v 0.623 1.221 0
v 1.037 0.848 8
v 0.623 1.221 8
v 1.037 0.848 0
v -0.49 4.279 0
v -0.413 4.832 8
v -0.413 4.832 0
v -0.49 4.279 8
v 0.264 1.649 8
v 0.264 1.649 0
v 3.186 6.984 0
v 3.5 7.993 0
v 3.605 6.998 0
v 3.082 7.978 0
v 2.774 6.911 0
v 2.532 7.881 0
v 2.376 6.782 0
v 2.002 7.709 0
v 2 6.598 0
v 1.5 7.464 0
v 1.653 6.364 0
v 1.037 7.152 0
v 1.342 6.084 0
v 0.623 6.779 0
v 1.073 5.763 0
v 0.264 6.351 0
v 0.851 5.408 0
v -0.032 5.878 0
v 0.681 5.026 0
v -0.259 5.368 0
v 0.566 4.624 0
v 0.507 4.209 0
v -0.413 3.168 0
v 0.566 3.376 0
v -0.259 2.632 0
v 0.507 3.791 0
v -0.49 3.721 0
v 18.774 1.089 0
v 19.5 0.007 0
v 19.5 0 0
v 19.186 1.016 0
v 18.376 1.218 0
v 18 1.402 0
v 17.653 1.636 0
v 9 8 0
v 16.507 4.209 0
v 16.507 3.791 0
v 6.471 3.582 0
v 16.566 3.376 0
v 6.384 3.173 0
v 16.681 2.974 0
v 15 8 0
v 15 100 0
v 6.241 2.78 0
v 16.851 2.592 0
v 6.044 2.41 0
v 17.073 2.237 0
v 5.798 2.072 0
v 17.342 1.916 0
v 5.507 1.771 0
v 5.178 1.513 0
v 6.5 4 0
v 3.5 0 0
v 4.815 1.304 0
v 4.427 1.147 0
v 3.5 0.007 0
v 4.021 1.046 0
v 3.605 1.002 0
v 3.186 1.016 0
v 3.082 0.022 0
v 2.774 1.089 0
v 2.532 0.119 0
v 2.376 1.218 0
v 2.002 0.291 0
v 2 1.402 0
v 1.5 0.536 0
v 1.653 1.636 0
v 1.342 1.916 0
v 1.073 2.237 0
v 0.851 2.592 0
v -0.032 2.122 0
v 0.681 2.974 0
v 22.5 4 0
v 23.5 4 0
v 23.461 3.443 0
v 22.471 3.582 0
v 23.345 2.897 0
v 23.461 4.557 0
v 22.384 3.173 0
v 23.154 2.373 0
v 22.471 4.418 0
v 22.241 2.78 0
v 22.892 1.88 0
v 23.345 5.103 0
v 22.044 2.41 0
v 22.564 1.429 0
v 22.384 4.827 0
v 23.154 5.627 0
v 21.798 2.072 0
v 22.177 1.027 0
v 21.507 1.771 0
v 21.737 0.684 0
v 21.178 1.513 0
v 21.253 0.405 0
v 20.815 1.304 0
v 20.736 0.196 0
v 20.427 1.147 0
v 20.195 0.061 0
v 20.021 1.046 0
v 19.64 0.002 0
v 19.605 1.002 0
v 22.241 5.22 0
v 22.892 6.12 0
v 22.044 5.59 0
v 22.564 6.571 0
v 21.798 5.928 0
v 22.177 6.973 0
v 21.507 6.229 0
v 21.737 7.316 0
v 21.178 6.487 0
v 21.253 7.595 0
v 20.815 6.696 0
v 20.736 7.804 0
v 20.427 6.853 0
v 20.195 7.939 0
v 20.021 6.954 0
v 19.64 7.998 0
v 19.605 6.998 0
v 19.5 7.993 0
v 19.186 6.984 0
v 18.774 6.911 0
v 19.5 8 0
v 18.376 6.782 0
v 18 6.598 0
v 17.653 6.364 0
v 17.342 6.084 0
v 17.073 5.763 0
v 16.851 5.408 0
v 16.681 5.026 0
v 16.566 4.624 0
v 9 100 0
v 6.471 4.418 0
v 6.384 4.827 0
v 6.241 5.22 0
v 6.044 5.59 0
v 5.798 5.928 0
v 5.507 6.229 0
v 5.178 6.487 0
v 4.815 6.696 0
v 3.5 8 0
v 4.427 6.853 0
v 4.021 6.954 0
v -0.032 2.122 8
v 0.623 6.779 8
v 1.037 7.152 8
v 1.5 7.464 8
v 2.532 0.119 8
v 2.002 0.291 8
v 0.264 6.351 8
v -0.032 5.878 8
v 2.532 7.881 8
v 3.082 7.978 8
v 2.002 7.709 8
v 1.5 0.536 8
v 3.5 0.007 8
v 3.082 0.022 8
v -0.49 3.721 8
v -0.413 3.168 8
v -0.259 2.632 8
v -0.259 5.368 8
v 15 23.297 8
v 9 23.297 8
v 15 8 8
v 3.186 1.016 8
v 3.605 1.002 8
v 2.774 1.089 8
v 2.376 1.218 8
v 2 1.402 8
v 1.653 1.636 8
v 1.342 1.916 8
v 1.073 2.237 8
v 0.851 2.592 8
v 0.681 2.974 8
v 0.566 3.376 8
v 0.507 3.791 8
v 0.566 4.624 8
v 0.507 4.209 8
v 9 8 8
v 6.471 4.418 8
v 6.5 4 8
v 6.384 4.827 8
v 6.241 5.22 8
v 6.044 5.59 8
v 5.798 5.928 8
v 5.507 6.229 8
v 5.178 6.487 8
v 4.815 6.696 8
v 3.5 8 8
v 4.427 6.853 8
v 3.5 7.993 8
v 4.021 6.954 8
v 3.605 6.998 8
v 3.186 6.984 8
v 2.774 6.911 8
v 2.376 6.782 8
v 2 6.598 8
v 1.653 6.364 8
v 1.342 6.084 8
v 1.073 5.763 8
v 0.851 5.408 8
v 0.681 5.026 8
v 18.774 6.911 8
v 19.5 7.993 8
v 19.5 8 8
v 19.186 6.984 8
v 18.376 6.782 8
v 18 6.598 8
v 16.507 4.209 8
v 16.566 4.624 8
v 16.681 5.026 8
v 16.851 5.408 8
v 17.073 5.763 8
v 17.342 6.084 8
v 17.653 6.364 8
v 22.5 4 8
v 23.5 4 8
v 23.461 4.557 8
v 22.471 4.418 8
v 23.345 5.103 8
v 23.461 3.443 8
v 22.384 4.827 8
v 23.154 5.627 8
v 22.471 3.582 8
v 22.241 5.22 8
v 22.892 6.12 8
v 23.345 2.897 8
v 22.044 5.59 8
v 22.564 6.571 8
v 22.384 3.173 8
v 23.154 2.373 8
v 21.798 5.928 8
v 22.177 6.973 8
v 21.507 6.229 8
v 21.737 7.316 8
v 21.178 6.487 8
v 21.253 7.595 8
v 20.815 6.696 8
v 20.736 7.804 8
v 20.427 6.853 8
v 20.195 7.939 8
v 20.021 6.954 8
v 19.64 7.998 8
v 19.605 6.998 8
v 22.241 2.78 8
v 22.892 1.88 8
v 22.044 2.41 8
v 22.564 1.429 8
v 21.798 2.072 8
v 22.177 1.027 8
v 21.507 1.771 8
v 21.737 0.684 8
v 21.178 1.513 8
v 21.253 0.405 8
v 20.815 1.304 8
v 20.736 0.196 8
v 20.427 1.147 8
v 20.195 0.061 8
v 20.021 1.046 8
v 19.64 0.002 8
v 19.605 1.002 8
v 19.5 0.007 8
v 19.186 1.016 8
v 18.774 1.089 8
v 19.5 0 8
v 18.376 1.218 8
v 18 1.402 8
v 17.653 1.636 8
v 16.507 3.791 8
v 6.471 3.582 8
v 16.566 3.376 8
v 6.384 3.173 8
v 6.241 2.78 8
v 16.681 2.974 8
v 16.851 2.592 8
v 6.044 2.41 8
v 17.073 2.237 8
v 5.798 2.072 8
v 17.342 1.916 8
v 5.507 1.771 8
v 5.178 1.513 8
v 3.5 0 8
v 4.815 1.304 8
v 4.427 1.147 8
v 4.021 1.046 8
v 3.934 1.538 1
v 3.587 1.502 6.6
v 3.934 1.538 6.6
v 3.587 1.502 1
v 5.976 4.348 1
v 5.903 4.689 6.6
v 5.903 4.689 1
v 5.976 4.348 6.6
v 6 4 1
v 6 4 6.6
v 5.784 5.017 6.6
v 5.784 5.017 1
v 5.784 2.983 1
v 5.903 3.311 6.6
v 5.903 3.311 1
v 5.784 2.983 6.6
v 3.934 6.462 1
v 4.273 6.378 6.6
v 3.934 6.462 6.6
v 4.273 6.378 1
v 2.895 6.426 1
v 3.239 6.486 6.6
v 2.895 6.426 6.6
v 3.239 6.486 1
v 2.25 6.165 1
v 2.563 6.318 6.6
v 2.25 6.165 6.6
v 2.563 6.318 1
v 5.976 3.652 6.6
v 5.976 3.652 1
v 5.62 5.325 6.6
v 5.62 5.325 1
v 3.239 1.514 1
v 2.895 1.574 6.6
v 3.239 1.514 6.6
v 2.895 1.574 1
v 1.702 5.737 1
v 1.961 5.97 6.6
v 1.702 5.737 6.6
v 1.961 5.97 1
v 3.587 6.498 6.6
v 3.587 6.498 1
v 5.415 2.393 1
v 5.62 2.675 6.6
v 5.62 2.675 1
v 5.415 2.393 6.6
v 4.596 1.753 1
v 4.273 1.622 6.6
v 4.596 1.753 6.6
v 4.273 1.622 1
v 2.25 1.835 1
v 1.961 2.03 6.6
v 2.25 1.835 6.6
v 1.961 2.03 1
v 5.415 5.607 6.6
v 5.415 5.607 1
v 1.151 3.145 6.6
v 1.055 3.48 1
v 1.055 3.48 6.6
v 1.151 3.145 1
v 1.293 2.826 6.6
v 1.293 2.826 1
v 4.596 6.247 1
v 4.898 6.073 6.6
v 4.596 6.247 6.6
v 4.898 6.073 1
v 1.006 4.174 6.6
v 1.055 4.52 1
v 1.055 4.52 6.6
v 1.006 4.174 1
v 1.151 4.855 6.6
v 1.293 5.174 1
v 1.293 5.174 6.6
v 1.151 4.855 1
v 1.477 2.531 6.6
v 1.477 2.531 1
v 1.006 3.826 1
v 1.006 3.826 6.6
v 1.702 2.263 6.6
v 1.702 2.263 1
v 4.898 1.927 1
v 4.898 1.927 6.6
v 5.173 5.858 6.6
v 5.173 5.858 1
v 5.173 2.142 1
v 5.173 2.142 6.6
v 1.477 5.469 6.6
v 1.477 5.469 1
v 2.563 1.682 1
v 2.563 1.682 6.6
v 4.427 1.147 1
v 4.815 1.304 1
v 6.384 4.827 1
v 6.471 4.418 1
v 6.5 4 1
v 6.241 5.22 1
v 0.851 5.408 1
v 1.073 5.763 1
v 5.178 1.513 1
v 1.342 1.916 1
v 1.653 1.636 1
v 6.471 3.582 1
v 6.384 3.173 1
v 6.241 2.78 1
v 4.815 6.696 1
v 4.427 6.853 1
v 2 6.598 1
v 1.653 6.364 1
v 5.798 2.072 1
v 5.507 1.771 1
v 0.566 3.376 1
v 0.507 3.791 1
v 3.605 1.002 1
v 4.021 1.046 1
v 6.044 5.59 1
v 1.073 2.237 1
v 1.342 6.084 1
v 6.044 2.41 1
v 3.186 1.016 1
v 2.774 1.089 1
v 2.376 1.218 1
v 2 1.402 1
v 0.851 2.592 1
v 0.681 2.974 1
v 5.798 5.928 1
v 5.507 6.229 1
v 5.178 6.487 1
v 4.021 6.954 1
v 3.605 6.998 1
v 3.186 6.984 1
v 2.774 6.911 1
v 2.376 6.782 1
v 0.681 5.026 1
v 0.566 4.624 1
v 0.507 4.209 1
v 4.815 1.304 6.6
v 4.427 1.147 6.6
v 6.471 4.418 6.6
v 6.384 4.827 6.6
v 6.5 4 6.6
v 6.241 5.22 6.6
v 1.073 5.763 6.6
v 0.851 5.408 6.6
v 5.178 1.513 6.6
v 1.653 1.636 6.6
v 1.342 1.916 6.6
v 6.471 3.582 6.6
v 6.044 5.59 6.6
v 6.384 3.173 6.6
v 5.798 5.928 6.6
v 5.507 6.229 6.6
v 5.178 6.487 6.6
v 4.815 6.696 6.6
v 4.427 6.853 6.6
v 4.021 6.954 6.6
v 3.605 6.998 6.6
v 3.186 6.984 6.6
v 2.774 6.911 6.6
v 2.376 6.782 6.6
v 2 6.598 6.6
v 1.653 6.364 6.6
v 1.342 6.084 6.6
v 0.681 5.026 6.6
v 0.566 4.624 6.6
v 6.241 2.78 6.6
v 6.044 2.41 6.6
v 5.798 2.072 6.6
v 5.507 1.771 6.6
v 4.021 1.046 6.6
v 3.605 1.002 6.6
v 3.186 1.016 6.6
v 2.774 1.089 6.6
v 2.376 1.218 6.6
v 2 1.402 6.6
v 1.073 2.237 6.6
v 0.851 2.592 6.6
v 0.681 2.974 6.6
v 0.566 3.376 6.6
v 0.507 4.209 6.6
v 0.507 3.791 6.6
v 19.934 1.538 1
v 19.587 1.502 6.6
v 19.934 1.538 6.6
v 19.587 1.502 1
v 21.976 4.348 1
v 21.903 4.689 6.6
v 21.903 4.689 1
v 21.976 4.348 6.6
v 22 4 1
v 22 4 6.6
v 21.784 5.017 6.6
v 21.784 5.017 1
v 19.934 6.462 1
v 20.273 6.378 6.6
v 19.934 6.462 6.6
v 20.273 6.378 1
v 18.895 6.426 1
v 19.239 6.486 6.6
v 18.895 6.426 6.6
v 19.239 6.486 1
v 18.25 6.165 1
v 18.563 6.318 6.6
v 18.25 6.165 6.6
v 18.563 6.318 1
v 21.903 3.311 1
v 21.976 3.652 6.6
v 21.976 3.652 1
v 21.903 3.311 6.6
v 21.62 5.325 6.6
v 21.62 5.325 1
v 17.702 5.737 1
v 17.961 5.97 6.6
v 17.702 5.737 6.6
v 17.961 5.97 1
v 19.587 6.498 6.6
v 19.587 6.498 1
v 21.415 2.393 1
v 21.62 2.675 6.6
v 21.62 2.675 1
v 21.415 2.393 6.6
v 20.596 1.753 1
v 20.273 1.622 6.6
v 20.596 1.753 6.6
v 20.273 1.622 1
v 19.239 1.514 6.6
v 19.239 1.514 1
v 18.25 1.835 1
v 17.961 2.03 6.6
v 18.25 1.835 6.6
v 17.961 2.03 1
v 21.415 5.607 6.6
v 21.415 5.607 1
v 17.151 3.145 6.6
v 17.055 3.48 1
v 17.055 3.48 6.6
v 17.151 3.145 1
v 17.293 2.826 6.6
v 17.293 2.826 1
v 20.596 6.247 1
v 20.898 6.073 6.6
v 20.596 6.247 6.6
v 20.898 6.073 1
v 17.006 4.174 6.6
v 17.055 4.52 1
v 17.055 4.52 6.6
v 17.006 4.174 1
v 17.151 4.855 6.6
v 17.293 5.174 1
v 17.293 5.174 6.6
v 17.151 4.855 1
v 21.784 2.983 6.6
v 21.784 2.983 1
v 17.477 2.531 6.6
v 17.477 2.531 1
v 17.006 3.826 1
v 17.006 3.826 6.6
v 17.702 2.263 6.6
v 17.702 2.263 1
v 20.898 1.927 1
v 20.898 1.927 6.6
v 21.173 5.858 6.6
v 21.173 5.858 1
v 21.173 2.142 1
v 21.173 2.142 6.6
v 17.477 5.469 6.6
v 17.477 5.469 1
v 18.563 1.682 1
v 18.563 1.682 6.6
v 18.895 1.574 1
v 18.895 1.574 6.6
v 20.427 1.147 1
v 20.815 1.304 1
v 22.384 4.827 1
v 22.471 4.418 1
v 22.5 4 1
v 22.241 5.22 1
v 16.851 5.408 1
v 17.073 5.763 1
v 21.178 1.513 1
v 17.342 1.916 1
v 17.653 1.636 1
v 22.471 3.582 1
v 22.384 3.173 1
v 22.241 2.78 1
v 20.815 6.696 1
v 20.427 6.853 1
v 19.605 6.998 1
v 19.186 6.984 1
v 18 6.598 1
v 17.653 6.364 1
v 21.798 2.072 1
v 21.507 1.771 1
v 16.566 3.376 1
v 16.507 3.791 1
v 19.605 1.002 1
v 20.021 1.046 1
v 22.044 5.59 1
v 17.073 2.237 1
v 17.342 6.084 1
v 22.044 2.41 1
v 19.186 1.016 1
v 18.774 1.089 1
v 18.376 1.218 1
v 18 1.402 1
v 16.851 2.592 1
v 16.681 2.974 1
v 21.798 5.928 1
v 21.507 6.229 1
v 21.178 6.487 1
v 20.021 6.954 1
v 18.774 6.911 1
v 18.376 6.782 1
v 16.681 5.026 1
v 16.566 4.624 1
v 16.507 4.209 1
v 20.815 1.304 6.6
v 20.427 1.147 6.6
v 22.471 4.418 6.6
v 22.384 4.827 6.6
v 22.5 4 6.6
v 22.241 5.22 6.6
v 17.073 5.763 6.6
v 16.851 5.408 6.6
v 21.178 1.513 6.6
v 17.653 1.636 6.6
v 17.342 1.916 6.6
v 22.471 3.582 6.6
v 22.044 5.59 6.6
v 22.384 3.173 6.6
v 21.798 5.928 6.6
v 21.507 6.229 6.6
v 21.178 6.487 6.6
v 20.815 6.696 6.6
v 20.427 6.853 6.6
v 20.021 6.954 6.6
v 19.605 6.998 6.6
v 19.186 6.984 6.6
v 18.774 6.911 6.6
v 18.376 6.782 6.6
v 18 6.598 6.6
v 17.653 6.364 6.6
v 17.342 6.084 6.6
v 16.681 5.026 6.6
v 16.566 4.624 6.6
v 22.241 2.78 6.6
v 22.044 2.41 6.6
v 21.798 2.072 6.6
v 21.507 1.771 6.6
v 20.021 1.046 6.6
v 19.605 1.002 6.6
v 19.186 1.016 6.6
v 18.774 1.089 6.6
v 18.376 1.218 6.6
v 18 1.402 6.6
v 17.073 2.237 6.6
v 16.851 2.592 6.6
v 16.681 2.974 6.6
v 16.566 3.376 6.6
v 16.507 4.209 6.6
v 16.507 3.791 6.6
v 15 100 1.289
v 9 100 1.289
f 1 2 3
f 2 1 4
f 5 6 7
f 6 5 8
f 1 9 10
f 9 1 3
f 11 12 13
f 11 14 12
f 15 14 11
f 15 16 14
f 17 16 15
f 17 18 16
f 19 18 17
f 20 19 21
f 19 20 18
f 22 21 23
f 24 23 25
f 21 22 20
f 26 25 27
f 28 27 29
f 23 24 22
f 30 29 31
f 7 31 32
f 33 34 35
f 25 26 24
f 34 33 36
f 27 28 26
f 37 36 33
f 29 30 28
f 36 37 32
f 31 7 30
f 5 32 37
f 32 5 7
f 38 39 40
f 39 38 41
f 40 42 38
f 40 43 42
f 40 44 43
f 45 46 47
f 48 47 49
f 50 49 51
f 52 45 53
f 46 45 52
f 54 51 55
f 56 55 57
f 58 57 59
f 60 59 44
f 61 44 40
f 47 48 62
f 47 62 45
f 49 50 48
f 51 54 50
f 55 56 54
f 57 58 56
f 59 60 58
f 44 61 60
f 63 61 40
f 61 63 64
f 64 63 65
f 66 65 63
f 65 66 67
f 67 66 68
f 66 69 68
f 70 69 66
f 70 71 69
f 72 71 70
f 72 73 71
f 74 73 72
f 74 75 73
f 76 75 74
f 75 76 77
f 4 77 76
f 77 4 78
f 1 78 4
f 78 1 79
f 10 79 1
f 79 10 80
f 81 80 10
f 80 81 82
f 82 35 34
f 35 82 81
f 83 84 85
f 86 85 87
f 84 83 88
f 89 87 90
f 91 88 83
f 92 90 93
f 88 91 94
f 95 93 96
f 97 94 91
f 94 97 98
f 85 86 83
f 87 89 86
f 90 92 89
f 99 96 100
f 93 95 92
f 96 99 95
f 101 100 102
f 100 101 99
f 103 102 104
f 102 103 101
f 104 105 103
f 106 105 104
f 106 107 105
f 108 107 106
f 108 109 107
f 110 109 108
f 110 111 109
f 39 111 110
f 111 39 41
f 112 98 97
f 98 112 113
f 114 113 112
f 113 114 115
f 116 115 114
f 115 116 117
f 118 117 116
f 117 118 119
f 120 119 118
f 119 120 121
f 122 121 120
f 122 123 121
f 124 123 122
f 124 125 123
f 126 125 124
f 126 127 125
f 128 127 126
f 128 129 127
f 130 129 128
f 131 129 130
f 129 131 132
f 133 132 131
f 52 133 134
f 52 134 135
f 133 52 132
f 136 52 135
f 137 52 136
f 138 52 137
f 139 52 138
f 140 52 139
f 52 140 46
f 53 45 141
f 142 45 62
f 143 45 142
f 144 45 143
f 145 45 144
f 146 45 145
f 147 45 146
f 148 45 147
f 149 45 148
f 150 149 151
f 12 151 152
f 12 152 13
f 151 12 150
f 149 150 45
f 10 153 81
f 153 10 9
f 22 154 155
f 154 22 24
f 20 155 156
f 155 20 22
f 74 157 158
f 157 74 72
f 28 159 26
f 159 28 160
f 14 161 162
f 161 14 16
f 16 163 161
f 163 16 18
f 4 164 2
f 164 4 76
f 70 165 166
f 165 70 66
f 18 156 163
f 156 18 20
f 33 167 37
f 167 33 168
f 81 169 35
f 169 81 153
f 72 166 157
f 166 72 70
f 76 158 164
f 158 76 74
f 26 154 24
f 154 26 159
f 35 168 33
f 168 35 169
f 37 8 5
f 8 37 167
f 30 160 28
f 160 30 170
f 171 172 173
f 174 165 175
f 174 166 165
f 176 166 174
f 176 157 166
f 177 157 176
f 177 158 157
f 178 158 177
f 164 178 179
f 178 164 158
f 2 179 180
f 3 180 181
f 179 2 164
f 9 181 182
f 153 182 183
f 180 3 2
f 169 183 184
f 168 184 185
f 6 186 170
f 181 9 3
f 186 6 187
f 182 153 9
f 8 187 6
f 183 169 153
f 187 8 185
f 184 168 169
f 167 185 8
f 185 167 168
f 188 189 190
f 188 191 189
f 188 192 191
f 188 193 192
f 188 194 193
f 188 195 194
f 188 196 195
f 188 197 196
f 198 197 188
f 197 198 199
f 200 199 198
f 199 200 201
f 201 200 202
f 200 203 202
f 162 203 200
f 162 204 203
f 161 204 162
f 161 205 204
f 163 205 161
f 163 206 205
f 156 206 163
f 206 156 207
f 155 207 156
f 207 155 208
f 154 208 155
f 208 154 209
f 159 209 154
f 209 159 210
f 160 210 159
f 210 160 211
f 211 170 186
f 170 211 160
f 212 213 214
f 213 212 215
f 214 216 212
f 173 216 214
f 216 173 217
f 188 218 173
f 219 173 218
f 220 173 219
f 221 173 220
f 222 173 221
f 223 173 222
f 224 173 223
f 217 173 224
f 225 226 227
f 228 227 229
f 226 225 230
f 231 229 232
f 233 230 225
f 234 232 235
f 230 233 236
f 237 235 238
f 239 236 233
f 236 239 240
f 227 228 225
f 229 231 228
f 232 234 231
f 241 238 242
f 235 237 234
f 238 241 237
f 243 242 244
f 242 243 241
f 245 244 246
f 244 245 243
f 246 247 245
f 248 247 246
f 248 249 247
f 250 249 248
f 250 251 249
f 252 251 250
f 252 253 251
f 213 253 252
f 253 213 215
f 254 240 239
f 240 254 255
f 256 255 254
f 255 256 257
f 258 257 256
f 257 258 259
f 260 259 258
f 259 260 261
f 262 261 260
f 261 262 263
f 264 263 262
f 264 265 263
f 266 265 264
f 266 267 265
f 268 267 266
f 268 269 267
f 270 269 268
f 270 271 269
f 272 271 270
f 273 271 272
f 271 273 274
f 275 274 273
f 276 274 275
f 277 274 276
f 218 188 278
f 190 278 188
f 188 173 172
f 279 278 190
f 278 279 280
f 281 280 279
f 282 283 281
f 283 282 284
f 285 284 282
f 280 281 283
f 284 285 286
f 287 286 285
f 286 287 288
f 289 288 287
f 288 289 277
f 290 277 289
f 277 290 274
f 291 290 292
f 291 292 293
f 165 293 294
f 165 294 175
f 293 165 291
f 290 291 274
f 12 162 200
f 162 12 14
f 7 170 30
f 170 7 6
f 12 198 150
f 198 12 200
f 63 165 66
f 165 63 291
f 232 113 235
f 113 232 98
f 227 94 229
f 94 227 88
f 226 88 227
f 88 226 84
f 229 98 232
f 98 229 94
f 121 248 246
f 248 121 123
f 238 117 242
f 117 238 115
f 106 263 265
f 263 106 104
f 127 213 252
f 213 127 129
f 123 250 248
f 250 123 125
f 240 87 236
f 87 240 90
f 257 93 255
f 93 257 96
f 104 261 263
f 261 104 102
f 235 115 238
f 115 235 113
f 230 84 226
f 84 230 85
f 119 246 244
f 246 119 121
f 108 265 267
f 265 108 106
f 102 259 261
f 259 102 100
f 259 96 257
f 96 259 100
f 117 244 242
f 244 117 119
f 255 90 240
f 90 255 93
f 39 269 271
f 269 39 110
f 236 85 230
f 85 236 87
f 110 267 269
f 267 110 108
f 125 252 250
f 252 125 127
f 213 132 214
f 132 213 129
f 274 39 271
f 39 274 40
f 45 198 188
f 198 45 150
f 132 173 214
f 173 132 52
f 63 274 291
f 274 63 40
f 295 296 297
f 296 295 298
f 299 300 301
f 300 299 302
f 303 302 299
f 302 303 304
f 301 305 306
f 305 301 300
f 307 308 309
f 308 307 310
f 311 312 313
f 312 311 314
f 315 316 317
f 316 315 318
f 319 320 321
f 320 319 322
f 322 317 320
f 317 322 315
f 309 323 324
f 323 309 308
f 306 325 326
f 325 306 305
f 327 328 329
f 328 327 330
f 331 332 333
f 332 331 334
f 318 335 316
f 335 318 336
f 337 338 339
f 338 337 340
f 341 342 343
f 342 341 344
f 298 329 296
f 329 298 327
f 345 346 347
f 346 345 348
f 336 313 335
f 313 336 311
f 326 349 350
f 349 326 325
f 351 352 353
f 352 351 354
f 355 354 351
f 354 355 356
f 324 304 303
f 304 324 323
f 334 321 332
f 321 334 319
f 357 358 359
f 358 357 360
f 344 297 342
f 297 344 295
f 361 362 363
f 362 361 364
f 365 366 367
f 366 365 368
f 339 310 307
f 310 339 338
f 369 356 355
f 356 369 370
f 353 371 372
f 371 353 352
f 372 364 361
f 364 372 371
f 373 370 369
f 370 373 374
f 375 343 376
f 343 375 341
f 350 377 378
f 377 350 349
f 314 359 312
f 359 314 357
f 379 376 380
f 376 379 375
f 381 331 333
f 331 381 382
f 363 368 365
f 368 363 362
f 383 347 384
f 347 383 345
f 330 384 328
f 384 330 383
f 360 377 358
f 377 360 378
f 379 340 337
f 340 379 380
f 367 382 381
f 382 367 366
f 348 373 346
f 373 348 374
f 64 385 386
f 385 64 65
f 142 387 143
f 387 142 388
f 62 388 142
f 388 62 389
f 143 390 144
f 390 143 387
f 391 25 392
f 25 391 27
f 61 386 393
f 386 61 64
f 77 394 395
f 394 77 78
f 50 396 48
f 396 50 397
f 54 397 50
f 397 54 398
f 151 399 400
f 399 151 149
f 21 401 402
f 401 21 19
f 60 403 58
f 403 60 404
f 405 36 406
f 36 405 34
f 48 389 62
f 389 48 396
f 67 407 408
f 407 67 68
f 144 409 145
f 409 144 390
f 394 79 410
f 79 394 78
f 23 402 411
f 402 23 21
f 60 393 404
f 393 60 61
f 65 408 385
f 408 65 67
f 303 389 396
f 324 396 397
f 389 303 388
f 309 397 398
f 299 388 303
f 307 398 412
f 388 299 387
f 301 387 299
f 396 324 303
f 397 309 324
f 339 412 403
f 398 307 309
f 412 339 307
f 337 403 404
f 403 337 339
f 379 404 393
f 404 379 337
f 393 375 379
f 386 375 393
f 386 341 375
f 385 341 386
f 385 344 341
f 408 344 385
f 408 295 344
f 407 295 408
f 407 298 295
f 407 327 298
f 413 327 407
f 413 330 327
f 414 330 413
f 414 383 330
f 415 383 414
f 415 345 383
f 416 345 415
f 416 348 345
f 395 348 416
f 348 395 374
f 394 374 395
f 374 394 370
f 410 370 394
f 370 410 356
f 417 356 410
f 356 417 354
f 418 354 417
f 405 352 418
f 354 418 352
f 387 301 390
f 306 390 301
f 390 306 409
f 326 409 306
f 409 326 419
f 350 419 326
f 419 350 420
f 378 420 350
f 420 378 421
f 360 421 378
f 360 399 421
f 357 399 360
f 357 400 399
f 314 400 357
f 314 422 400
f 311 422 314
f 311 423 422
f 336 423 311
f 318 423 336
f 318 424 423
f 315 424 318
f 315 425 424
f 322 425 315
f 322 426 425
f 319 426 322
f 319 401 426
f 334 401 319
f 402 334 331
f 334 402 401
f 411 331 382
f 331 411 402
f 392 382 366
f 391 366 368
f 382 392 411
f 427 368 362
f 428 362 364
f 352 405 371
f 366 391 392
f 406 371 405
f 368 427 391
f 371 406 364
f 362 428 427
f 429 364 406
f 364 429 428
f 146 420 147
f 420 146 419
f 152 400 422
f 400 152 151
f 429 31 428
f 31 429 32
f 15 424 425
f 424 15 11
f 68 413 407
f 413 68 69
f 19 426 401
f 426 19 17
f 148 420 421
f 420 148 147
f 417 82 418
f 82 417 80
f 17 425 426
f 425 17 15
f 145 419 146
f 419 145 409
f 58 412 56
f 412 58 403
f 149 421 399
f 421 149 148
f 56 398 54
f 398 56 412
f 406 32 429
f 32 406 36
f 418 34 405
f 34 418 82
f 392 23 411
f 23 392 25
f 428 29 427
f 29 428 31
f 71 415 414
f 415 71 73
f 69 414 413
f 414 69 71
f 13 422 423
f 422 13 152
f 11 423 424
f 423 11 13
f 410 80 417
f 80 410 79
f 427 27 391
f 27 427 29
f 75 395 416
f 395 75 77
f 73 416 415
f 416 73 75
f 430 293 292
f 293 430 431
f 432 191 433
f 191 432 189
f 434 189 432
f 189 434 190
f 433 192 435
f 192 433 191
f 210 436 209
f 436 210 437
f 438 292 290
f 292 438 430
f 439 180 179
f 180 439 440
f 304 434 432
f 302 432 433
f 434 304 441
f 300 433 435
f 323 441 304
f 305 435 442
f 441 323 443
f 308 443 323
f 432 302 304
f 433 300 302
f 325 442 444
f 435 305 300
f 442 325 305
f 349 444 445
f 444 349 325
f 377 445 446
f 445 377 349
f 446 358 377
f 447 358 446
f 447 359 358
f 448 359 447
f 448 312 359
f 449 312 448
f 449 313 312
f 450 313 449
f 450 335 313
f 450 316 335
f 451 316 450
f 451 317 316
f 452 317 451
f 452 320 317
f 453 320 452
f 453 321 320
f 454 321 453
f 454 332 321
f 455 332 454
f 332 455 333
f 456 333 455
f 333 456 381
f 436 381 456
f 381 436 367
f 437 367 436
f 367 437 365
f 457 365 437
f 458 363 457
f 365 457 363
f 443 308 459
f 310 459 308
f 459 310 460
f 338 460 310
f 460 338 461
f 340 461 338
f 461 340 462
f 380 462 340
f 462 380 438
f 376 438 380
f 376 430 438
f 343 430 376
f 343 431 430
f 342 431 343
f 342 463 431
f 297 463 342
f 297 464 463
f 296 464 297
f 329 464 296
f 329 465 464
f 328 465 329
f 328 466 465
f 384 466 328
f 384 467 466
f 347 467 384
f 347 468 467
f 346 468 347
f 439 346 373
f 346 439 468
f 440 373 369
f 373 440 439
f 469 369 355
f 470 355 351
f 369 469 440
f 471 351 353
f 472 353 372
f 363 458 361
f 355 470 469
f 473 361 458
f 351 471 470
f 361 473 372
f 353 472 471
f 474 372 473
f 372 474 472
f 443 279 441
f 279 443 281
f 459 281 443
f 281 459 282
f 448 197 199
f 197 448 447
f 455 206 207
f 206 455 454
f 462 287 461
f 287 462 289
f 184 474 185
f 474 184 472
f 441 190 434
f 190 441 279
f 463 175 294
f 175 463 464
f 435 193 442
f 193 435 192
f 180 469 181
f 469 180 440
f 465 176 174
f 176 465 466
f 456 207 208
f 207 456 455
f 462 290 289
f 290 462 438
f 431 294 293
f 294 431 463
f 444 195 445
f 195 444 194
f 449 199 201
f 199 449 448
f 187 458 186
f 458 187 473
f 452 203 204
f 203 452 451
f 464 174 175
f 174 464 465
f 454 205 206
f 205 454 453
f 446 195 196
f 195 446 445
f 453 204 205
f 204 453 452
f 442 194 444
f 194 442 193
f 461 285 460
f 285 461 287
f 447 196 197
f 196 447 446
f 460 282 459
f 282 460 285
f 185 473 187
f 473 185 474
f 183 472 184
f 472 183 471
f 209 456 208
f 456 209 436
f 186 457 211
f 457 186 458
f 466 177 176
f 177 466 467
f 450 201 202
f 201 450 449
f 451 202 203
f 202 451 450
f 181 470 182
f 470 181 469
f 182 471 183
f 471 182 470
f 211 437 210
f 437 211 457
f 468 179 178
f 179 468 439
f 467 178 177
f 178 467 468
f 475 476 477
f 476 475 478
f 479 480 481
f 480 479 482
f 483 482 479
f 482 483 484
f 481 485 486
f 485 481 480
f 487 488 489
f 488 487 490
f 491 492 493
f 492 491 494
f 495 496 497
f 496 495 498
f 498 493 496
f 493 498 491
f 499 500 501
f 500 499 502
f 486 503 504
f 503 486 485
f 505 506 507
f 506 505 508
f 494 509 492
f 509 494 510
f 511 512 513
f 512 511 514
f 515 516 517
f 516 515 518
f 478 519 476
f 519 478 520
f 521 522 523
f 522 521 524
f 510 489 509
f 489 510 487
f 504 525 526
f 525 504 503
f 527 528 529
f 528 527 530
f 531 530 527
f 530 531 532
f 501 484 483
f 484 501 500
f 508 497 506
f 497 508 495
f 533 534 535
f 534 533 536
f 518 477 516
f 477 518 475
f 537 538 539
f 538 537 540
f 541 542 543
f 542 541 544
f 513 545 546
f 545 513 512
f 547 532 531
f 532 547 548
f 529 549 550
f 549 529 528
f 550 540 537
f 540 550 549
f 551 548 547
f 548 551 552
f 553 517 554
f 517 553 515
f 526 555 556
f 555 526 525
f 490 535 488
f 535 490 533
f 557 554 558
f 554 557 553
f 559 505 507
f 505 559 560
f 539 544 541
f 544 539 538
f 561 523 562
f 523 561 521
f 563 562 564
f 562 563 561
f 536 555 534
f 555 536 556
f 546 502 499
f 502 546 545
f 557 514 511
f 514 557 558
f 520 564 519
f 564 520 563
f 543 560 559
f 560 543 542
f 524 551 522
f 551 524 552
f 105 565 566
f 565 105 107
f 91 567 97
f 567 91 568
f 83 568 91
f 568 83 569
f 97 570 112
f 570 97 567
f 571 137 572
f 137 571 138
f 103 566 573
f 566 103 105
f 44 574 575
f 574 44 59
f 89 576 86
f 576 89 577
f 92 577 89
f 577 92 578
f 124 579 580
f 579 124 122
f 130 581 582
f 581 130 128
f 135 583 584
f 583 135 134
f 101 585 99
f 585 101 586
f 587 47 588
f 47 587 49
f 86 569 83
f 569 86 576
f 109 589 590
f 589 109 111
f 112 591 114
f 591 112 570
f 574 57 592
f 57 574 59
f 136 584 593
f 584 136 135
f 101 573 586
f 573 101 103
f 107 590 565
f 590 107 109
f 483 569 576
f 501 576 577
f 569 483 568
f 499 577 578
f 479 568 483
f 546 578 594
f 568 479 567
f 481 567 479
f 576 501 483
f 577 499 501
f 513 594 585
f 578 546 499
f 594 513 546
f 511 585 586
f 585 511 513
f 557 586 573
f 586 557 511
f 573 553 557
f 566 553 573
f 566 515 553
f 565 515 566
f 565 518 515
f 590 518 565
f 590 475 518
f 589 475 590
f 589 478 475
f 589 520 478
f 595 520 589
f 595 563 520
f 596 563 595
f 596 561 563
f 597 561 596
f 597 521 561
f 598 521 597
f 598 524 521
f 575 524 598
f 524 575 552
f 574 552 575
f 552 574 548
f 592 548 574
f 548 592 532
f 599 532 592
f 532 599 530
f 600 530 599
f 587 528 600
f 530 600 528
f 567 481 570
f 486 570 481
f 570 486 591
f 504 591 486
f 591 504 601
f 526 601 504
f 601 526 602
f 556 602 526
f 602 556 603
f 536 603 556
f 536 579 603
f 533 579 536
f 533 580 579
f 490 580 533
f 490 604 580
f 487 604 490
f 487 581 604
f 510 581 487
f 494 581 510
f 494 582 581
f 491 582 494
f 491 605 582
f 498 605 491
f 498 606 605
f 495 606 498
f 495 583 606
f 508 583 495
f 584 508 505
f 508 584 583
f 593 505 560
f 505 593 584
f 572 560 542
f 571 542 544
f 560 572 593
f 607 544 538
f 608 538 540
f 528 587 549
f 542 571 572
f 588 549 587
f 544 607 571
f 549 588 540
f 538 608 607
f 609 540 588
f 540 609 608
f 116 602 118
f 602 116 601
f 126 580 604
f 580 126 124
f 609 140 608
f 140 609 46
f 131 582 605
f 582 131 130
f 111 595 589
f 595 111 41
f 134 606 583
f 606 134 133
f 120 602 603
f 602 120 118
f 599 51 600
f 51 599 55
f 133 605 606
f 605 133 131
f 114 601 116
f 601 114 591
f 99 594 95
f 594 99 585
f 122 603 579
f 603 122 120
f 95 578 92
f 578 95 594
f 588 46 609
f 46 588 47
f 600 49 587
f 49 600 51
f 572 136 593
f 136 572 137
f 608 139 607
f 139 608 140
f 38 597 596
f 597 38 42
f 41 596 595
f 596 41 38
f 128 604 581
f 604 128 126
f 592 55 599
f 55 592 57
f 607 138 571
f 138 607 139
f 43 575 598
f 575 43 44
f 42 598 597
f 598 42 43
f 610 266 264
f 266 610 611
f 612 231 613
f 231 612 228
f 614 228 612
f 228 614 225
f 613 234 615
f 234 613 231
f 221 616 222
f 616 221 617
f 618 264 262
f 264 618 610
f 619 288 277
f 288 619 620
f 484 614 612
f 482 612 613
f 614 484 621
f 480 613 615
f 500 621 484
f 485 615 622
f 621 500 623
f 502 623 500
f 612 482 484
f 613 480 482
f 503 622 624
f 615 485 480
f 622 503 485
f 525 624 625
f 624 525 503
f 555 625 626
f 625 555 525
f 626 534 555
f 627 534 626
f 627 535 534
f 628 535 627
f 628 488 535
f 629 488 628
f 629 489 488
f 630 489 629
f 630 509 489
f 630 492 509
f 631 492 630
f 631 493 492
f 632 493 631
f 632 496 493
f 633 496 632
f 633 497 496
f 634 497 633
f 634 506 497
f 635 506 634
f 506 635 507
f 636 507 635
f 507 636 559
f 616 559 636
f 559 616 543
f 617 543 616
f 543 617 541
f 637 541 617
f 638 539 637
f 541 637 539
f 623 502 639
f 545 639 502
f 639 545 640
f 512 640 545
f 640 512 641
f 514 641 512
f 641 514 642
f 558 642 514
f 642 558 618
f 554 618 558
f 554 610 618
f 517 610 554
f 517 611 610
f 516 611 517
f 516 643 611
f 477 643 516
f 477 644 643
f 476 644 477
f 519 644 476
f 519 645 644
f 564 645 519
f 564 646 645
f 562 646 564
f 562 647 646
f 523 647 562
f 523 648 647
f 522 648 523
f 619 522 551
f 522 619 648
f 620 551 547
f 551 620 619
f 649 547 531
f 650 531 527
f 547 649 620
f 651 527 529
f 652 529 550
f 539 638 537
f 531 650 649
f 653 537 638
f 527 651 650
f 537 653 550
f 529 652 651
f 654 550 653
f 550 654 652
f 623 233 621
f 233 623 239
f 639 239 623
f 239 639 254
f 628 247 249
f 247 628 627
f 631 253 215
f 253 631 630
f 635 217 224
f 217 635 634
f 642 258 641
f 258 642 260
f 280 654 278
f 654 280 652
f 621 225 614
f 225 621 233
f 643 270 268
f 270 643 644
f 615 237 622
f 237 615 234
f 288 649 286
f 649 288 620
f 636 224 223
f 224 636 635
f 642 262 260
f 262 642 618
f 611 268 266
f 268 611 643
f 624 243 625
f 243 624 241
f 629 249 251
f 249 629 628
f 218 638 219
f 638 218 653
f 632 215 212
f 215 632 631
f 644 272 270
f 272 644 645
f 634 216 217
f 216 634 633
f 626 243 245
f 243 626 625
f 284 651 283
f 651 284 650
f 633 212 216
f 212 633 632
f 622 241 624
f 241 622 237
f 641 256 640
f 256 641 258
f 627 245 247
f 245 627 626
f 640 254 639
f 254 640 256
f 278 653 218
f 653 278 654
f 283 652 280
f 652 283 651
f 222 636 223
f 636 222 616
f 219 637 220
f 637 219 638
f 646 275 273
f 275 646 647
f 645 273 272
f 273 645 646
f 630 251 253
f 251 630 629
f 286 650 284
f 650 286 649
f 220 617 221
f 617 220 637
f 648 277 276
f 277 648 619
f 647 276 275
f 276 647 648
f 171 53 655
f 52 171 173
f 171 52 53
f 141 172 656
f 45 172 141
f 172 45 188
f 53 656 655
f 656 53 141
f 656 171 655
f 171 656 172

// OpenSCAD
$fn = 45;

atomMount();

module atomMount() {
    difference() {
        translate([0, 0, 0]) {
            translate([3.5, 0, 0]) cube([16, 8, 8]);
            translate([3.5, 4, 0]) {
                difference() {
                    cylinder(d = 8, h = 8);
                    translate([0, -5, 0]) cube([9, 9, 9]);
                }
            }
            translate([19.5, 4, 0]) {
                difference() {
                    cylinder(d = 8, h = 8);
                    translate([0, 5, 0]) cube([9, 9, 9]);
                }
            }
        }
        translate([3.5, 4, -0.5]) {
            cylinder(d = 5, h = 9);
            cylinder(d = 6, h = 1.5);
            translate([0, 0, 7.1]) cylinder(d = 6, h = 1.5);
        }
        translate([19.5, 4, -0.5]) {
            cylinder(d = 5, h = 9);
            cylinder(d = 6, h = 1.5);
            translate([0, 0, 7.1]) cylinder(d = 6, h = 1.5);
        }
    }
    translate([9, 0, 0]) {
        difference() {
            cube([6, 100, 8]);
            rotate([-5, 0, 0]) translate([-1, 0, 10]) cube([8, 100, 8]);
        }
    }
    
}
